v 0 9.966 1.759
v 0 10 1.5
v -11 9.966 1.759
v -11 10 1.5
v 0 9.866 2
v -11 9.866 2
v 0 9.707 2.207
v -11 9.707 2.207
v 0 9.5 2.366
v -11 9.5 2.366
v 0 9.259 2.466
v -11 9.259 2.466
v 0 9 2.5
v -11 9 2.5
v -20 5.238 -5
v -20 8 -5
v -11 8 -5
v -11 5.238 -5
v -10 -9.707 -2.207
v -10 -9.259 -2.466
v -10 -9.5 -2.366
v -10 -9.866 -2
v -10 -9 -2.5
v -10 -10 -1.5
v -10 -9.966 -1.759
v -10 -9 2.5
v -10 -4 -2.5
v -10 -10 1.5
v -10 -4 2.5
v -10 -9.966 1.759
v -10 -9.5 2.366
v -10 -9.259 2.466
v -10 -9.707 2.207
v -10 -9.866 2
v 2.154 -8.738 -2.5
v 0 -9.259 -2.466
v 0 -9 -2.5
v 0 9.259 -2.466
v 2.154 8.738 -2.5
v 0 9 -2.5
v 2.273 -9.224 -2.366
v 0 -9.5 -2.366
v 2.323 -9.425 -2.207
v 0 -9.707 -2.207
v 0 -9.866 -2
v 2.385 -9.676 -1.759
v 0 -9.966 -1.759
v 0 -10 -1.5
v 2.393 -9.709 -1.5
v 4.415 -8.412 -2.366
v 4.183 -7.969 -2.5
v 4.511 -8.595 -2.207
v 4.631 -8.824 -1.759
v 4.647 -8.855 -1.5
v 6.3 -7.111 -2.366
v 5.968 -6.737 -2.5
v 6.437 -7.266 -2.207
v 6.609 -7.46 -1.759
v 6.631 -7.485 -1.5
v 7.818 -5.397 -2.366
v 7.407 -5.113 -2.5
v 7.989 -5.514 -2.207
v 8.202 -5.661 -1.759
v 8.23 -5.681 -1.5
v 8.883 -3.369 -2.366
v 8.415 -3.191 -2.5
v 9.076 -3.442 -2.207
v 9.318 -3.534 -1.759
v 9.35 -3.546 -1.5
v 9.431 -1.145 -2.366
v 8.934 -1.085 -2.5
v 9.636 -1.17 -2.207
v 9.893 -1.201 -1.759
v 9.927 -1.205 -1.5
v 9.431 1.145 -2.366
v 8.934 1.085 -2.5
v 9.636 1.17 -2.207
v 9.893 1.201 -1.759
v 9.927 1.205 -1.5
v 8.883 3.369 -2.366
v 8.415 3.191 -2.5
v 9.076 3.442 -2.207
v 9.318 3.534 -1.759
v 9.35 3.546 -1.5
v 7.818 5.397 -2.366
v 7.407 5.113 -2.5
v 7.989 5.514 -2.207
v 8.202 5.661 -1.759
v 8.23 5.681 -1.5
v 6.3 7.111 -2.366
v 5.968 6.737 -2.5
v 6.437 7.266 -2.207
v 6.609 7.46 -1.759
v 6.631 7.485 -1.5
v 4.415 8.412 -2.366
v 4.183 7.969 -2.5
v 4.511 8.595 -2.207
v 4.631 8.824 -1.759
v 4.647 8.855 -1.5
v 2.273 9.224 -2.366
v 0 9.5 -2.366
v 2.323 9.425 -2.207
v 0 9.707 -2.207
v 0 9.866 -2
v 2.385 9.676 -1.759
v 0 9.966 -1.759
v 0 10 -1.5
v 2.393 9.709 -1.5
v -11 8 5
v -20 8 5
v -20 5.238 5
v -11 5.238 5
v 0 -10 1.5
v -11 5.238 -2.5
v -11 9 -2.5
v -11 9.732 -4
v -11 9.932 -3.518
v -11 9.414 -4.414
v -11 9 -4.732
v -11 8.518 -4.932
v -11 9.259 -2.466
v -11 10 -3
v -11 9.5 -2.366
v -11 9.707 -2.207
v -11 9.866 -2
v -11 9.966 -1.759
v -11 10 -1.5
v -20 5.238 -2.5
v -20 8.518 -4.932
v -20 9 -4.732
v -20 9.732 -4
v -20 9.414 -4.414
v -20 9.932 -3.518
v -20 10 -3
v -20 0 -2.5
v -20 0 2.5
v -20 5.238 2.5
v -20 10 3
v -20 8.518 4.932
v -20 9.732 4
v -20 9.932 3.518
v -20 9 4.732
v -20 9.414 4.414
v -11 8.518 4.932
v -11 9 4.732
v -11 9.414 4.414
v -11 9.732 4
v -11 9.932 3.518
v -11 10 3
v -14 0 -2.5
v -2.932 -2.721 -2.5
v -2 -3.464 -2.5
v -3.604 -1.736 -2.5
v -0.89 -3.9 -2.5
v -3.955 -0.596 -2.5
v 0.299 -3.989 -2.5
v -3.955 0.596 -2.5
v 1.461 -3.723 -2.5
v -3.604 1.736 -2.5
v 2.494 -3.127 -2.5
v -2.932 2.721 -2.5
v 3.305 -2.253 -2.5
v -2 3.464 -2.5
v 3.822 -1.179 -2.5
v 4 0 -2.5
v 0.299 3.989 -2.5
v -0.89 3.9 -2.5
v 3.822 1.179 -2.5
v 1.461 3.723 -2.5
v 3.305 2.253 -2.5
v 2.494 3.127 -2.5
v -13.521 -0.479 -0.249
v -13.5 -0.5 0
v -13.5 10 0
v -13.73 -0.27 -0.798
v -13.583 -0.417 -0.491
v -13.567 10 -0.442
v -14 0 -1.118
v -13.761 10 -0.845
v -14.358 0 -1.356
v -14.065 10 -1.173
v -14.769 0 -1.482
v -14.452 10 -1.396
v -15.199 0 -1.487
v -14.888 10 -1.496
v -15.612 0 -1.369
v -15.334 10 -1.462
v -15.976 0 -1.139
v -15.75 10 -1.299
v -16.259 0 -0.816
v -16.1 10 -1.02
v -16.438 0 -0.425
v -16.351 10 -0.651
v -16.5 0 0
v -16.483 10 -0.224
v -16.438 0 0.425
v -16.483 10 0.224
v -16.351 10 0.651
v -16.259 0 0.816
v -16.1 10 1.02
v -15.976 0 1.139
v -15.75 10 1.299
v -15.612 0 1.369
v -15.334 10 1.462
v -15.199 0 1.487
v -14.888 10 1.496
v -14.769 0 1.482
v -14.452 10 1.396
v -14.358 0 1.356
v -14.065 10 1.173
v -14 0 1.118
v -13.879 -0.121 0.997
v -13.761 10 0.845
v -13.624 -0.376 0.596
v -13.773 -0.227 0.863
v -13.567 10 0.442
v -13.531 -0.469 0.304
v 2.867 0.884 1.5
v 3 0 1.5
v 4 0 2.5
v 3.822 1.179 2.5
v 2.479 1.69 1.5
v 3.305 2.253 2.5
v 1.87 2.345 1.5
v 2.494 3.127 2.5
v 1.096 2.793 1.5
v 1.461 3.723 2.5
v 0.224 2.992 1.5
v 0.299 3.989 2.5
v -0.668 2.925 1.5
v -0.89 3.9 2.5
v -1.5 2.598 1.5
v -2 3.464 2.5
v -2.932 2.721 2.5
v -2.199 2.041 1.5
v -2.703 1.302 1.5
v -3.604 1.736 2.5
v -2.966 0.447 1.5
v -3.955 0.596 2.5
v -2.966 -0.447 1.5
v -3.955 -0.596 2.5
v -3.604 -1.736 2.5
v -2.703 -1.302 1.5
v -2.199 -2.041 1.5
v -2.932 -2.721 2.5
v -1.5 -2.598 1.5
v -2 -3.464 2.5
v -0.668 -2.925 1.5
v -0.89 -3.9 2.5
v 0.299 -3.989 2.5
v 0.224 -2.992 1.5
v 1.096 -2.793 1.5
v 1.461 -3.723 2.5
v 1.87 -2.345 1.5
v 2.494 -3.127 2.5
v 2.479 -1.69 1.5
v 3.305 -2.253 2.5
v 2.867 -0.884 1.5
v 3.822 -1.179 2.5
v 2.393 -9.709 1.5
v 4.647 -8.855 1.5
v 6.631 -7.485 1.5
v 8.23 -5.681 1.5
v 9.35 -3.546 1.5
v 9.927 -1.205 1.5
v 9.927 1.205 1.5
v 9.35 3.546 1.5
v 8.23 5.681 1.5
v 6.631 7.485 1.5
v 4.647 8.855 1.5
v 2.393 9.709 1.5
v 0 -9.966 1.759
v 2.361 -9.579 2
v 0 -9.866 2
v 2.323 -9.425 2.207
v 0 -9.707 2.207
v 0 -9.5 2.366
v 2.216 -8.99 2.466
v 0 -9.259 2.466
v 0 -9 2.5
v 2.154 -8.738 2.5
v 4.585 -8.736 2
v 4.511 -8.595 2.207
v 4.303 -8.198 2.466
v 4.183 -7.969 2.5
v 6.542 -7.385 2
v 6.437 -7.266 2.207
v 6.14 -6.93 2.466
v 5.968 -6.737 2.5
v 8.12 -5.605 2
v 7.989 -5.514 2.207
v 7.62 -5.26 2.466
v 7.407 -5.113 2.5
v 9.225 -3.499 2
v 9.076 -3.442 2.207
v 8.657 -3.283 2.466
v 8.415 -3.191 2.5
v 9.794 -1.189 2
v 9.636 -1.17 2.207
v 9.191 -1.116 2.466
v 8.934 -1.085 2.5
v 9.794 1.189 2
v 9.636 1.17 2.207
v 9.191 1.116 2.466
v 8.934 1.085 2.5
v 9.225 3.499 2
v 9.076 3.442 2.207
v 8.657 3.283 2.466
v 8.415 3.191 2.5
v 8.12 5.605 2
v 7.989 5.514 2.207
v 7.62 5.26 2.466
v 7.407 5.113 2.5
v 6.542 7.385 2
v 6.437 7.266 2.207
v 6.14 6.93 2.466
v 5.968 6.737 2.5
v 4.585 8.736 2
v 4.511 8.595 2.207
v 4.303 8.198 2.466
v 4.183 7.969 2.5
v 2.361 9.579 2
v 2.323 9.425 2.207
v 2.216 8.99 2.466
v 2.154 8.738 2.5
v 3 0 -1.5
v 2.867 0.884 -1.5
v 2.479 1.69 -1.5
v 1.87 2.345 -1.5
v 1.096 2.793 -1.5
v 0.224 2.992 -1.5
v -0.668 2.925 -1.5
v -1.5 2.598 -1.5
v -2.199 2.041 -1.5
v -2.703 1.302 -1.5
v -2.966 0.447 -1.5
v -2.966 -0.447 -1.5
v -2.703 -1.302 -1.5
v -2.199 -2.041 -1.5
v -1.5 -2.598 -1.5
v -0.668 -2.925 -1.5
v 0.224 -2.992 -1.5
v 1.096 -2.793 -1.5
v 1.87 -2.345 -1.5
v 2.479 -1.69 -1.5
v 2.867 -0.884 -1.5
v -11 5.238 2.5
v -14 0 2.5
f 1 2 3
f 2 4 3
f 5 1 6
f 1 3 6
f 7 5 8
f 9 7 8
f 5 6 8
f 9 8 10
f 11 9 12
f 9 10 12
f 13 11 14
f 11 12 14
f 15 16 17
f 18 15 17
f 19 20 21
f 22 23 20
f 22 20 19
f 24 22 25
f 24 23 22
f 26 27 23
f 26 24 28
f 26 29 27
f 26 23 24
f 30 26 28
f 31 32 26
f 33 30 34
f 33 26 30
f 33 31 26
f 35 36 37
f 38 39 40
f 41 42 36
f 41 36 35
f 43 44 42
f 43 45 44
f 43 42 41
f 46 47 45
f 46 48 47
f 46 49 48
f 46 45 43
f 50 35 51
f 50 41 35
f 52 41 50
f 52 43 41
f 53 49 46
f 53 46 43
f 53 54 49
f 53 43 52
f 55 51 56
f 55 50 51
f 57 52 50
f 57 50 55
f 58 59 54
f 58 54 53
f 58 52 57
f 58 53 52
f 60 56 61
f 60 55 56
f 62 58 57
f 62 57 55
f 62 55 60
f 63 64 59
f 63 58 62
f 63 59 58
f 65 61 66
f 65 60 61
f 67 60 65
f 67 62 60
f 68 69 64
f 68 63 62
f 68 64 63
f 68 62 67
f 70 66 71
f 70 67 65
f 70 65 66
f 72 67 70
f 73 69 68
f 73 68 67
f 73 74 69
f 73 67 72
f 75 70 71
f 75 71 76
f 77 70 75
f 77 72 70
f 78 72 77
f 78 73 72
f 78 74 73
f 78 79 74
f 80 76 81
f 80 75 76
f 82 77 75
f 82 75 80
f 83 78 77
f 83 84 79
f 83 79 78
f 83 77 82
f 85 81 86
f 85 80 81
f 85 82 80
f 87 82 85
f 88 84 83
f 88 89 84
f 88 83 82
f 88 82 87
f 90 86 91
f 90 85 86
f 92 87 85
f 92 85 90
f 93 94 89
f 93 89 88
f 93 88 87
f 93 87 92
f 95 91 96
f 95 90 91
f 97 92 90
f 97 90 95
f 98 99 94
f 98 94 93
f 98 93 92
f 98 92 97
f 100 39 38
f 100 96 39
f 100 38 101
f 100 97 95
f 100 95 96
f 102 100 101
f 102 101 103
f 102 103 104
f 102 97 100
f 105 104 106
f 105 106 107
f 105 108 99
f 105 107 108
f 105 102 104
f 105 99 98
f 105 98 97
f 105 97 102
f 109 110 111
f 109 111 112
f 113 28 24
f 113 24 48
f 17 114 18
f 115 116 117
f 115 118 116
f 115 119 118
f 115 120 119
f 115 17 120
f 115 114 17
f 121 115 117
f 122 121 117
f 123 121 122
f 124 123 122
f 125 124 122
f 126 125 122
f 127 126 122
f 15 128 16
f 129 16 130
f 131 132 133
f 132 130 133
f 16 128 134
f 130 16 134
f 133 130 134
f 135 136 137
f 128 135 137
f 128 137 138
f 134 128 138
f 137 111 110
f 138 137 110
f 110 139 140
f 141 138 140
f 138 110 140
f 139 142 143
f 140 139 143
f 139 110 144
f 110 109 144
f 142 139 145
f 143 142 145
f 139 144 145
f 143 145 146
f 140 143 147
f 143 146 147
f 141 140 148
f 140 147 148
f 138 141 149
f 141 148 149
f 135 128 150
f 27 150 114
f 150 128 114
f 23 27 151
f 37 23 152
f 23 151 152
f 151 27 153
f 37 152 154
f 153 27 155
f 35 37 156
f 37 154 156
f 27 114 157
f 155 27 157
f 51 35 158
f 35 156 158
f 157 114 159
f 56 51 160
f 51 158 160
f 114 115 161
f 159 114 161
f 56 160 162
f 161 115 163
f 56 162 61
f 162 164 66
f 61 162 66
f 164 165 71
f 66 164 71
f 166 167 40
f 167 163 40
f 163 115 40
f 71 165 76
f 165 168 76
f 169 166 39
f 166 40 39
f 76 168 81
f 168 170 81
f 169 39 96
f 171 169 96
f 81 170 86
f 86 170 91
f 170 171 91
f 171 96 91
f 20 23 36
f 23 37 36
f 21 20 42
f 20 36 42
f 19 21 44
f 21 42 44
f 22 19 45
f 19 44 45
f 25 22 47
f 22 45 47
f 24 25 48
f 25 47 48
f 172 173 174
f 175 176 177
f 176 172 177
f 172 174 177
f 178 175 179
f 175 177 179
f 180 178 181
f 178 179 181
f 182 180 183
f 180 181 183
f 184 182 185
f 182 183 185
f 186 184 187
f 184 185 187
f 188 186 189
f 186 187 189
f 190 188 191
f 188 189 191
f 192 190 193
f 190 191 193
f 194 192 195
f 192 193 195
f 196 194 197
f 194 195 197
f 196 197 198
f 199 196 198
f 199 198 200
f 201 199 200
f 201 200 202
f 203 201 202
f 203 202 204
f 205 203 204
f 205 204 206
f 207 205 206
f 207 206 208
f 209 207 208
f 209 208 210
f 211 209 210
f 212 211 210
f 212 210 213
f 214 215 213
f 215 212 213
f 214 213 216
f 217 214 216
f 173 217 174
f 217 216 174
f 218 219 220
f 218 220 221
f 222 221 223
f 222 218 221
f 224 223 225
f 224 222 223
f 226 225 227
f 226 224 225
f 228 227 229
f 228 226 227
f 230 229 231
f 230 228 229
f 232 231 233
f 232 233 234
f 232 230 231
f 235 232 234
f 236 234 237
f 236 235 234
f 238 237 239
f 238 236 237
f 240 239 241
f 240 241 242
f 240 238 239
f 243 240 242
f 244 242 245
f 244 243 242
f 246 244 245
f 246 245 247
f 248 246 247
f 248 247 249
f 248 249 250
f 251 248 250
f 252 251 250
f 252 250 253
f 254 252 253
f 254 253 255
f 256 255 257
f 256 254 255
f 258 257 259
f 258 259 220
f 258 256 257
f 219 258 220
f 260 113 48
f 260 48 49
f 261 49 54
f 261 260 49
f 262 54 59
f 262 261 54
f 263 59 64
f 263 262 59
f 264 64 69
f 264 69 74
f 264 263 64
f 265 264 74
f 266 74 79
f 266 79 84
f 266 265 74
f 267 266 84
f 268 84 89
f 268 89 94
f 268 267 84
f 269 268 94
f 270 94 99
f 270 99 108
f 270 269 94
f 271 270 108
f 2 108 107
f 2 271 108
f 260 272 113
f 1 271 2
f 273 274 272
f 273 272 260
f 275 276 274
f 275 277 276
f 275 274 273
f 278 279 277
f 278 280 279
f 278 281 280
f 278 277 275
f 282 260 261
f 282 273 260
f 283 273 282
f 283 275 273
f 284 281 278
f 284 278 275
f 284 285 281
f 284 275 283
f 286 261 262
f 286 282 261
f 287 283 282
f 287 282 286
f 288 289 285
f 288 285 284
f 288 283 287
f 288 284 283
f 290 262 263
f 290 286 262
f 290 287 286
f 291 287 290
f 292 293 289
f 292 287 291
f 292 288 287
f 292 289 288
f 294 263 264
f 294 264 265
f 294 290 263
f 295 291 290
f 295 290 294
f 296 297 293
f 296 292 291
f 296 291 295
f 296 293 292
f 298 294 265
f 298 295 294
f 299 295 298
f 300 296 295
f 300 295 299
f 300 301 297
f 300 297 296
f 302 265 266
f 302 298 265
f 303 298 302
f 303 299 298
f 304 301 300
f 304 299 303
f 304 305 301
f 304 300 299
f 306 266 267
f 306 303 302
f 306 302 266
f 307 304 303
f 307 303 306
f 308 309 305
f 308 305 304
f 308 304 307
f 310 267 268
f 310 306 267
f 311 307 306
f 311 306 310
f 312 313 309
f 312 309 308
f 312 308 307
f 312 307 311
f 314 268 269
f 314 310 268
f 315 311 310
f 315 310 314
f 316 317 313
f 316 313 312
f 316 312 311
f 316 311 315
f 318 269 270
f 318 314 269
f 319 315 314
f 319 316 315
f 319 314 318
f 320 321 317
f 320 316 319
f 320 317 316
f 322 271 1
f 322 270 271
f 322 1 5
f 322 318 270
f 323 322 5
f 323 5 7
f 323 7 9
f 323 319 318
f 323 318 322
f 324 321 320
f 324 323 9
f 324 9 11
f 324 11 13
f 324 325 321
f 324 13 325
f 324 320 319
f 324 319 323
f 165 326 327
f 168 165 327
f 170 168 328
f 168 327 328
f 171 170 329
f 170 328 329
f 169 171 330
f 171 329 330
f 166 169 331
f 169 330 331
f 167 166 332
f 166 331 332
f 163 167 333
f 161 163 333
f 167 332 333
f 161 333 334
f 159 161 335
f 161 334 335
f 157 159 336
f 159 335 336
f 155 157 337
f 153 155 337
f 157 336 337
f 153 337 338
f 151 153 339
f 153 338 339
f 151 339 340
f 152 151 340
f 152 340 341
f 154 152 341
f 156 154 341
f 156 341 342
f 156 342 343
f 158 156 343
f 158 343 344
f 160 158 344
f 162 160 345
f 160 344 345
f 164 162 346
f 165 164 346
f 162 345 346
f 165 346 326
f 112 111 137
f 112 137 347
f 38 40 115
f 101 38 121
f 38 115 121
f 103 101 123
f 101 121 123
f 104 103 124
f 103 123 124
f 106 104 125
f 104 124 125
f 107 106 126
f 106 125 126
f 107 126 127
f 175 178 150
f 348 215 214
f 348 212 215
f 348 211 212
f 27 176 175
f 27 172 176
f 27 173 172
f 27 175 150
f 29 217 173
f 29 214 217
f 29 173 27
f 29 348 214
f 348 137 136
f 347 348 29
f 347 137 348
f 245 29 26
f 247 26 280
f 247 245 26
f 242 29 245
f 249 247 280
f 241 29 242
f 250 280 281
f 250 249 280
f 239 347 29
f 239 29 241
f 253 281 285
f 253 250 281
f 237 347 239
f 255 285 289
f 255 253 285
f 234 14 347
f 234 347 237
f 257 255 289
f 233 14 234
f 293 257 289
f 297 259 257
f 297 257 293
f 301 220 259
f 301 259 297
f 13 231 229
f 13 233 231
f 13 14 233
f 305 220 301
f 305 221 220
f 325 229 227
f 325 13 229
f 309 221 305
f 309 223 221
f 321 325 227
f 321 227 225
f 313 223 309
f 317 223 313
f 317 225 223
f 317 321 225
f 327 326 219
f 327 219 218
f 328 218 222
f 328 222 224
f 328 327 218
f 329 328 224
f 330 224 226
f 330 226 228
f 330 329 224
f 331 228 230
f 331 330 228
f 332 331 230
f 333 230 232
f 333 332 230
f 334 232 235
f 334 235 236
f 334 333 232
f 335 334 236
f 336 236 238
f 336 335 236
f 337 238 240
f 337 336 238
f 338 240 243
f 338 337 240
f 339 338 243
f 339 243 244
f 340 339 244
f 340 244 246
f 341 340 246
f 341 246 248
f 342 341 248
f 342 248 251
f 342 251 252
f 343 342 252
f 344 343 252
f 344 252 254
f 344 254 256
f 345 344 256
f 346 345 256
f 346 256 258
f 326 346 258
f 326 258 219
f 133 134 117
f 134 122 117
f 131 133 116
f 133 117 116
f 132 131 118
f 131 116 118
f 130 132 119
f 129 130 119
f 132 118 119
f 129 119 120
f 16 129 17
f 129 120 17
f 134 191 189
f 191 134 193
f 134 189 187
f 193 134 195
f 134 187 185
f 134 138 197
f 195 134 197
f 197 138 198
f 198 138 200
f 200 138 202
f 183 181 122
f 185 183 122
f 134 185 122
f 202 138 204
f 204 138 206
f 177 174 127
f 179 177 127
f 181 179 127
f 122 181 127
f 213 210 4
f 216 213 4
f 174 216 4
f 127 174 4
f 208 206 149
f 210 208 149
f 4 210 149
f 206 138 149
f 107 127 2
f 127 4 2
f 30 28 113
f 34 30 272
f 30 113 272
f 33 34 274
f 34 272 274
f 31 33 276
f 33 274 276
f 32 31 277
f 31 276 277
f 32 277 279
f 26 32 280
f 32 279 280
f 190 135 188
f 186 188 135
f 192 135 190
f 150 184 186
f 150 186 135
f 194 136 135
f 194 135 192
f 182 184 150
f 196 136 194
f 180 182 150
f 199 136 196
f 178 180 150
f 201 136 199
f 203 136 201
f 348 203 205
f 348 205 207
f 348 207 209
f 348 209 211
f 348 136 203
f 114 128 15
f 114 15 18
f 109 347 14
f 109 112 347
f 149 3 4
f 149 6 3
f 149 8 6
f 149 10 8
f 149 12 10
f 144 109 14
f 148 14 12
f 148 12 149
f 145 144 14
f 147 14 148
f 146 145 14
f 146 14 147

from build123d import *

# Parameters (mm, degrees)
SKETCH1_R           = 3
BOSS_EXTRUDE1_DEPTH = 2.5
SKETCH2_W           = 9
SKETCH2_H           = 4.761904762
BOSS_EXTRUDE2_DEPTH = 5
FILLET1_R           = 2
CHAMFER1_SIZE       = 1
FILLET2_R           = 1
SKETCH3_R           = 1.5
CUT_EXTRUDE1_DEPTH  = 20


with BuildPart() as part:
    # Sketch1 → Boss-Extrude1 (new body, symmetric)
    with BuildSketch(Plane.XY):
        with BuildLine():
            Line((0, 10), (-20, 10))
            Line((-20, 10), (-20, 0))
            Line((-20, 0), (-14, 0))
            Line((-14, 0), (-10, -4))
            Line((-10, -4), (-10, -10))
            Line((-10, -10), (0, -10))
            ThreePointArc((0, -10), (10, 0), (0, 10))
        make_face()
        Circle(SKETCH1_R, mode=Mode.SUBTRACT)
    extrude(amount=BOSS_EXTRUDE1_DEPTH, both=True)

    # Sketch2 → Boss-Extrude2 (add, symmetric)
    with BuildSketch(Plane.XY):
        with Locations((-15.5, 7.619047619)):
            Rectangle(SKETCH2_W, SKETCH2_H)
    extrude(amount=BOSS_EXTRUDE2_DEPTH, both=True)

    # Fillet1
    fillet1_edges = [part.edges().sort_by_distance(p)[0] for p in [
        (-15.5, 10, -5),
        (-15.5, 10, 5),
    ]]
    fillet(fillet1_edges, radius=FILLET1_R)

    # Chamfer1
    chamfer1_edges = [part.edges().sort_by_distance(p)[0] for p in [
        (-3, 0, -2.5),
        (-3, 0, 2.5),
    ]]
    chamfer(chamfer1_edges, length=CHAMFER1_SIZE)

    # Fillet2
    fillet2_edges = [part.edges().sort_by_distance(p)[0] for p in [
        (-5, -10, 2.5),
        (10, 0, 2.5),
        (-5.5, 10, 2.5),
        (-5.5, 10, -2.5),
        (10, 0, -2.5),
        (-5, -10, -2.5),
    ]]
    fillet(fillet2_edges, radius=FILLET2_R)

    # Sketch3 → Cut-Extrude1 (cut)
    with BuildSketch(Plane(origin=(0, 10, 0), x_dir=(1, 0, 0), z_dir=(0, 1, 0))):
        with Locations((-15, 0)):
            Circle(SKETCH3_R)
    extrude(amount=-CUT_EXTRUDE1_DEPTH, mode=Mode.SUBTRACT)


solid = part.part
